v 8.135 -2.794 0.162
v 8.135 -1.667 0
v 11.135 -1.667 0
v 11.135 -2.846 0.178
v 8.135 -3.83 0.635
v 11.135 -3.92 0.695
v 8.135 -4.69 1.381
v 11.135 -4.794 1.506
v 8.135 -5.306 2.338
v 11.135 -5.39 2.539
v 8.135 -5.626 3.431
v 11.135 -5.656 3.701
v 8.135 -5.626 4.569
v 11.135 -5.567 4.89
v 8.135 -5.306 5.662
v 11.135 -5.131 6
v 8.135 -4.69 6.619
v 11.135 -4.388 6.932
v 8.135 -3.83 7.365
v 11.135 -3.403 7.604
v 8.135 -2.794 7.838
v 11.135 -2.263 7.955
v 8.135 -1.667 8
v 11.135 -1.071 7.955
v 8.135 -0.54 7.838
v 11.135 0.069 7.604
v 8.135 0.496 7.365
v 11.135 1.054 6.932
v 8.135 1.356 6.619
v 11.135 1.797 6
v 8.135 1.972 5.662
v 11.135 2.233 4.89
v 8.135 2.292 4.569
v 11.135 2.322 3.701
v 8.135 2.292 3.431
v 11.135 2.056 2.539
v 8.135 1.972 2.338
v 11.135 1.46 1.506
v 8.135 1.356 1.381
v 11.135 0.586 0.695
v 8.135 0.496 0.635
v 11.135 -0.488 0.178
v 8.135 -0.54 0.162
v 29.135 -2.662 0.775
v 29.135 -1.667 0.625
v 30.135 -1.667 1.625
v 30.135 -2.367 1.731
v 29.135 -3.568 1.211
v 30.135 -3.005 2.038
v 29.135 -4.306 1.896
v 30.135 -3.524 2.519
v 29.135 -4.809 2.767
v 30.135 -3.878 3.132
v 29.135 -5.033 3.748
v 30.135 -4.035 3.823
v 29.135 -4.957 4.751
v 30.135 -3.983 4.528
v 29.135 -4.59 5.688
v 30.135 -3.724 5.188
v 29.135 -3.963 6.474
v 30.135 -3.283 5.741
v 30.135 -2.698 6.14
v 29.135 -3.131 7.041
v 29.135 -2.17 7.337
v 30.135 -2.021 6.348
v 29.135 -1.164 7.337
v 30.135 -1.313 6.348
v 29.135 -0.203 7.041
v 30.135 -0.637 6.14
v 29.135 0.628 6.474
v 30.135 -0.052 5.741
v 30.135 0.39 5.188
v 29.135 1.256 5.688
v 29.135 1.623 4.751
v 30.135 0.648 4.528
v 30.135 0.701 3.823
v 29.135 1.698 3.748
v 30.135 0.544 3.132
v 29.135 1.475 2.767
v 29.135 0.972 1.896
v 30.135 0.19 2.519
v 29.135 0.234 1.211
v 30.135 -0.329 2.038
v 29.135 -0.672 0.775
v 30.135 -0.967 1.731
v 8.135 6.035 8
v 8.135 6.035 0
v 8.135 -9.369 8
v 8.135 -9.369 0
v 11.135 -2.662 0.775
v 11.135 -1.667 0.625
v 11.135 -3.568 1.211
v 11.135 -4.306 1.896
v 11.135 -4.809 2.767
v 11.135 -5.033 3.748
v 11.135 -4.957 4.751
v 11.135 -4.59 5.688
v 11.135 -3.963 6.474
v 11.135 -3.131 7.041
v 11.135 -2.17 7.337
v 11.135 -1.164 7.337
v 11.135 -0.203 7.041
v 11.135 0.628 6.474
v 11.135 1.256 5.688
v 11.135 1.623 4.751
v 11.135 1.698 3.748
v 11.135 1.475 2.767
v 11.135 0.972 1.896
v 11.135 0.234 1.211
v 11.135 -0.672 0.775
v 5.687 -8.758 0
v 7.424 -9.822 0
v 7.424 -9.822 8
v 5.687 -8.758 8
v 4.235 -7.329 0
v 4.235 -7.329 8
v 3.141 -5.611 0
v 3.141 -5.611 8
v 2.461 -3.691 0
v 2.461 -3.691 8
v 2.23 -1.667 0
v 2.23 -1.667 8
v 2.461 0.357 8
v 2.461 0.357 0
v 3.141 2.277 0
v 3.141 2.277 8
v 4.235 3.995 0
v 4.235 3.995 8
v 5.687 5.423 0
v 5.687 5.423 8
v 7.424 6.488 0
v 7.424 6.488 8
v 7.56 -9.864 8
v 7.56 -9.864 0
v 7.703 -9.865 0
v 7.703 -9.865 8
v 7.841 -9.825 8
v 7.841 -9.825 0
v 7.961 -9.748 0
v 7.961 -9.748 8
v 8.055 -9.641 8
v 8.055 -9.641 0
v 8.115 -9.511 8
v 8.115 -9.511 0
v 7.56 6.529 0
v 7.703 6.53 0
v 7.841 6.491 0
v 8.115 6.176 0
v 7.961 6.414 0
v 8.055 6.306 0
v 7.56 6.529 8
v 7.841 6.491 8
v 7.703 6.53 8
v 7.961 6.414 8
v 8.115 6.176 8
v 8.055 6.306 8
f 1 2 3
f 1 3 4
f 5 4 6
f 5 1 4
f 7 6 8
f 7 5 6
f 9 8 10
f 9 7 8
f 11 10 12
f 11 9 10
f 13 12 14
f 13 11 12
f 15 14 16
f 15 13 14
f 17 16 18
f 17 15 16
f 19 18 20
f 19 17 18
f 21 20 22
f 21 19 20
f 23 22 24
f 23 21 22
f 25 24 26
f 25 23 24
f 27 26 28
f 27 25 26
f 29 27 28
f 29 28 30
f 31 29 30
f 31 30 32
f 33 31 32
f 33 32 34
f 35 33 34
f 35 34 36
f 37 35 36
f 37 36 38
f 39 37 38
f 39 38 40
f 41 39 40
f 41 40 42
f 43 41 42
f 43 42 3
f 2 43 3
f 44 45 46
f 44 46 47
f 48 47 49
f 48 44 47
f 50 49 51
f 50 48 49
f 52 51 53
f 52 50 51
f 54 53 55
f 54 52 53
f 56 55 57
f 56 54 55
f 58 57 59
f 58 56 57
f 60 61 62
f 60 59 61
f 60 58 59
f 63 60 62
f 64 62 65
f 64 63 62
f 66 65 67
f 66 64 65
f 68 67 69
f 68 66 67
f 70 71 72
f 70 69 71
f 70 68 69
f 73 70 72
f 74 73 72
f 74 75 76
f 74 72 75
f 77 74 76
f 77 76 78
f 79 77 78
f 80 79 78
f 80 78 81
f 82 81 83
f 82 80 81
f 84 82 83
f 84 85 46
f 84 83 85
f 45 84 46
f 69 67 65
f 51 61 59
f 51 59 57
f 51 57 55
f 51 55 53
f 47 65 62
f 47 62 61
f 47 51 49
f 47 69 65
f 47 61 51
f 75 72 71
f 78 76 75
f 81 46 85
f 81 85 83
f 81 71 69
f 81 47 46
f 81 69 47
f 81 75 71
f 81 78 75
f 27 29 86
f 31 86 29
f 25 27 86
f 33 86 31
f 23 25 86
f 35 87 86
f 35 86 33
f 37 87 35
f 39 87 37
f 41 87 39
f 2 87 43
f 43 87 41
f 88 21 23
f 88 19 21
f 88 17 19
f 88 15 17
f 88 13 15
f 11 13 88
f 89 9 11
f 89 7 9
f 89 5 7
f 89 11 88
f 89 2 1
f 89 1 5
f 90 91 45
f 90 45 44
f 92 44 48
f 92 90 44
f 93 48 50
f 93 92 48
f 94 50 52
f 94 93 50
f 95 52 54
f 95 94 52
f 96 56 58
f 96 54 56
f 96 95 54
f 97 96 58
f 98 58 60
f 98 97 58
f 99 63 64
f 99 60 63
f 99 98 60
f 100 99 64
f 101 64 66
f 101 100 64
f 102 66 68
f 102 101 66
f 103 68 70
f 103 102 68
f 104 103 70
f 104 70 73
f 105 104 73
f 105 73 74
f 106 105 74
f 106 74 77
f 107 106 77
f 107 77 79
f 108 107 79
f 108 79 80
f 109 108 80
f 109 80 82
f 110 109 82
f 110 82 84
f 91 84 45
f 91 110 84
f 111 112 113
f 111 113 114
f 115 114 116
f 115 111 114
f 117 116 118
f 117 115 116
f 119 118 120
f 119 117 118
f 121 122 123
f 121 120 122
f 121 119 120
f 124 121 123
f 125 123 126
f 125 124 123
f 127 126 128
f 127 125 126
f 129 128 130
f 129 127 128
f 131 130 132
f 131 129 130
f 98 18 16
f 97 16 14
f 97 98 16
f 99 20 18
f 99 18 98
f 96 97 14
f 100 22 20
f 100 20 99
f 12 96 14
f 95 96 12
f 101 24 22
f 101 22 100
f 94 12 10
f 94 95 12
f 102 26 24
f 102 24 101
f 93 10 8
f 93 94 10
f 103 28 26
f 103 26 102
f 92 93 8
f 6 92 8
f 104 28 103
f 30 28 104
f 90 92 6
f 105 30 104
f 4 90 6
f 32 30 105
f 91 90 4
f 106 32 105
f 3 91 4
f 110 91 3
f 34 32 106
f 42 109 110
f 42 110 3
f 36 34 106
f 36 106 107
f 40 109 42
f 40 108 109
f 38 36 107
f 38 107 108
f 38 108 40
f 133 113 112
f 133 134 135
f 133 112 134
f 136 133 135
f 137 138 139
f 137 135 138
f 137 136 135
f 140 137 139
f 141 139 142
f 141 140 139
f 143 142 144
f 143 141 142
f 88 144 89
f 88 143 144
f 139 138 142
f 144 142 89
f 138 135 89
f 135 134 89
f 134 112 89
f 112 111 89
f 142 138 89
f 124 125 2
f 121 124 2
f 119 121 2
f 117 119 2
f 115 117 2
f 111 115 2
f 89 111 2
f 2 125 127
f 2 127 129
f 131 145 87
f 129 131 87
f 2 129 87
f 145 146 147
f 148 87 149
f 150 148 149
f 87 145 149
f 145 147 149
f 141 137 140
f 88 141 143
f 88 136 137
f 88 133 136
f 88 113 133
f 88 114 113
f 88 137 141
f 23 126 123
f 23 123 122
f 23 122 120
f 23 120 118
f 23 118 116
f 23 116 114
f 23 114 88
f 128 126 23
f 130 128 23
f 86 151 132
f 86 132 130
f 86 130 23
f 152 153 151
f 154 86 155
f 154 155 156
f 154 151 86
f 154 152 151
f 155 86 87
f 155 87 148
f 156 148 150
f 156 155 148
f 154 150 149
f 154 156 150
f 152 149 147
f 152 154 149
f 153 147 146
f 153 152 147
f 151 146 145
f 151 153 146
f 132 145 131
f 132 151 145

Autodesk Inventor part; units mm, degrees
ref_plane "YZ Plane" through (0, 0, 0) normal (1, 0, 0) x (0, 1, 0)
ref_plane "XZ Plane" through (0, 0, 0) normal (0, 1, 0) x (-1, 0, 0)
ref_plane "XY Plane" through (0, 0, 0) normal (0, 0, 1) x (1, 0, 0)
sketch "Boceto1" plane through (0, 0, 0) normal (0, 0, 1) x (1, 0, 0)
  arc A0 (8.1351, 6.7837) -> (8.1351, -10.1182) centre (11.2305, -1.6673) ccw
  line L0 (8.1351, 6.7837) -> (8.1351, -10.1182)
  point P0 (0, 0)
  dimension "d2" = 18
extrude "Extrusión1" add sketch "Boceto1" along normal blind 8
fillet "Empalme3" radius 0.5 1 edges at (8.1351, 6.7837, 4)
fillet "Empalme4" radius 0.5 1 edges at (8.1351, -10.1182, 4)
sketch "Boceto4" plane through (8.1351, 6.0349, 8) normal (1, 0, 0) x (0, 0, -1)
  line L0 (8, 0.4531) -> (0, 0.4531) projected
  line L1 (4, 0.4531) -> (4, -7.7019)
  line L2 (0, -15.8574) -> (8, -15.8574) projected
  circle A0 centre (4, -7.7019) radius 4
  point P0 (8, -6.0349)
  dimension "d29" = 8.155
  dimension "d30" = 8
extrude "Extrusión4" add sketch "Boceto4" along normal blind 3
sketch "Boceto5" plane through (11.1351, -1.6671, 4) normal (1, 0, 0) x (0, 0, -1)
  circle A0 centre (0, 0) radius 3.375
  point P0 (4, 1.6671)
  dimension "d33" = 6.75
extrude "Extrusión5" add sketch "Boceto5" along normal blind 19
chamfer "Chaflán2" distance 1 angle 45 1 edges at (30.1351, -1.6671, 7.375)
sketch "Boceto6" plane through (0, 0, 8) normal (0, 0, 1) x (1, 0, 0)
  point P0 (0, 0)
properties part number "Tornillo" material "Acero inoxidable"
